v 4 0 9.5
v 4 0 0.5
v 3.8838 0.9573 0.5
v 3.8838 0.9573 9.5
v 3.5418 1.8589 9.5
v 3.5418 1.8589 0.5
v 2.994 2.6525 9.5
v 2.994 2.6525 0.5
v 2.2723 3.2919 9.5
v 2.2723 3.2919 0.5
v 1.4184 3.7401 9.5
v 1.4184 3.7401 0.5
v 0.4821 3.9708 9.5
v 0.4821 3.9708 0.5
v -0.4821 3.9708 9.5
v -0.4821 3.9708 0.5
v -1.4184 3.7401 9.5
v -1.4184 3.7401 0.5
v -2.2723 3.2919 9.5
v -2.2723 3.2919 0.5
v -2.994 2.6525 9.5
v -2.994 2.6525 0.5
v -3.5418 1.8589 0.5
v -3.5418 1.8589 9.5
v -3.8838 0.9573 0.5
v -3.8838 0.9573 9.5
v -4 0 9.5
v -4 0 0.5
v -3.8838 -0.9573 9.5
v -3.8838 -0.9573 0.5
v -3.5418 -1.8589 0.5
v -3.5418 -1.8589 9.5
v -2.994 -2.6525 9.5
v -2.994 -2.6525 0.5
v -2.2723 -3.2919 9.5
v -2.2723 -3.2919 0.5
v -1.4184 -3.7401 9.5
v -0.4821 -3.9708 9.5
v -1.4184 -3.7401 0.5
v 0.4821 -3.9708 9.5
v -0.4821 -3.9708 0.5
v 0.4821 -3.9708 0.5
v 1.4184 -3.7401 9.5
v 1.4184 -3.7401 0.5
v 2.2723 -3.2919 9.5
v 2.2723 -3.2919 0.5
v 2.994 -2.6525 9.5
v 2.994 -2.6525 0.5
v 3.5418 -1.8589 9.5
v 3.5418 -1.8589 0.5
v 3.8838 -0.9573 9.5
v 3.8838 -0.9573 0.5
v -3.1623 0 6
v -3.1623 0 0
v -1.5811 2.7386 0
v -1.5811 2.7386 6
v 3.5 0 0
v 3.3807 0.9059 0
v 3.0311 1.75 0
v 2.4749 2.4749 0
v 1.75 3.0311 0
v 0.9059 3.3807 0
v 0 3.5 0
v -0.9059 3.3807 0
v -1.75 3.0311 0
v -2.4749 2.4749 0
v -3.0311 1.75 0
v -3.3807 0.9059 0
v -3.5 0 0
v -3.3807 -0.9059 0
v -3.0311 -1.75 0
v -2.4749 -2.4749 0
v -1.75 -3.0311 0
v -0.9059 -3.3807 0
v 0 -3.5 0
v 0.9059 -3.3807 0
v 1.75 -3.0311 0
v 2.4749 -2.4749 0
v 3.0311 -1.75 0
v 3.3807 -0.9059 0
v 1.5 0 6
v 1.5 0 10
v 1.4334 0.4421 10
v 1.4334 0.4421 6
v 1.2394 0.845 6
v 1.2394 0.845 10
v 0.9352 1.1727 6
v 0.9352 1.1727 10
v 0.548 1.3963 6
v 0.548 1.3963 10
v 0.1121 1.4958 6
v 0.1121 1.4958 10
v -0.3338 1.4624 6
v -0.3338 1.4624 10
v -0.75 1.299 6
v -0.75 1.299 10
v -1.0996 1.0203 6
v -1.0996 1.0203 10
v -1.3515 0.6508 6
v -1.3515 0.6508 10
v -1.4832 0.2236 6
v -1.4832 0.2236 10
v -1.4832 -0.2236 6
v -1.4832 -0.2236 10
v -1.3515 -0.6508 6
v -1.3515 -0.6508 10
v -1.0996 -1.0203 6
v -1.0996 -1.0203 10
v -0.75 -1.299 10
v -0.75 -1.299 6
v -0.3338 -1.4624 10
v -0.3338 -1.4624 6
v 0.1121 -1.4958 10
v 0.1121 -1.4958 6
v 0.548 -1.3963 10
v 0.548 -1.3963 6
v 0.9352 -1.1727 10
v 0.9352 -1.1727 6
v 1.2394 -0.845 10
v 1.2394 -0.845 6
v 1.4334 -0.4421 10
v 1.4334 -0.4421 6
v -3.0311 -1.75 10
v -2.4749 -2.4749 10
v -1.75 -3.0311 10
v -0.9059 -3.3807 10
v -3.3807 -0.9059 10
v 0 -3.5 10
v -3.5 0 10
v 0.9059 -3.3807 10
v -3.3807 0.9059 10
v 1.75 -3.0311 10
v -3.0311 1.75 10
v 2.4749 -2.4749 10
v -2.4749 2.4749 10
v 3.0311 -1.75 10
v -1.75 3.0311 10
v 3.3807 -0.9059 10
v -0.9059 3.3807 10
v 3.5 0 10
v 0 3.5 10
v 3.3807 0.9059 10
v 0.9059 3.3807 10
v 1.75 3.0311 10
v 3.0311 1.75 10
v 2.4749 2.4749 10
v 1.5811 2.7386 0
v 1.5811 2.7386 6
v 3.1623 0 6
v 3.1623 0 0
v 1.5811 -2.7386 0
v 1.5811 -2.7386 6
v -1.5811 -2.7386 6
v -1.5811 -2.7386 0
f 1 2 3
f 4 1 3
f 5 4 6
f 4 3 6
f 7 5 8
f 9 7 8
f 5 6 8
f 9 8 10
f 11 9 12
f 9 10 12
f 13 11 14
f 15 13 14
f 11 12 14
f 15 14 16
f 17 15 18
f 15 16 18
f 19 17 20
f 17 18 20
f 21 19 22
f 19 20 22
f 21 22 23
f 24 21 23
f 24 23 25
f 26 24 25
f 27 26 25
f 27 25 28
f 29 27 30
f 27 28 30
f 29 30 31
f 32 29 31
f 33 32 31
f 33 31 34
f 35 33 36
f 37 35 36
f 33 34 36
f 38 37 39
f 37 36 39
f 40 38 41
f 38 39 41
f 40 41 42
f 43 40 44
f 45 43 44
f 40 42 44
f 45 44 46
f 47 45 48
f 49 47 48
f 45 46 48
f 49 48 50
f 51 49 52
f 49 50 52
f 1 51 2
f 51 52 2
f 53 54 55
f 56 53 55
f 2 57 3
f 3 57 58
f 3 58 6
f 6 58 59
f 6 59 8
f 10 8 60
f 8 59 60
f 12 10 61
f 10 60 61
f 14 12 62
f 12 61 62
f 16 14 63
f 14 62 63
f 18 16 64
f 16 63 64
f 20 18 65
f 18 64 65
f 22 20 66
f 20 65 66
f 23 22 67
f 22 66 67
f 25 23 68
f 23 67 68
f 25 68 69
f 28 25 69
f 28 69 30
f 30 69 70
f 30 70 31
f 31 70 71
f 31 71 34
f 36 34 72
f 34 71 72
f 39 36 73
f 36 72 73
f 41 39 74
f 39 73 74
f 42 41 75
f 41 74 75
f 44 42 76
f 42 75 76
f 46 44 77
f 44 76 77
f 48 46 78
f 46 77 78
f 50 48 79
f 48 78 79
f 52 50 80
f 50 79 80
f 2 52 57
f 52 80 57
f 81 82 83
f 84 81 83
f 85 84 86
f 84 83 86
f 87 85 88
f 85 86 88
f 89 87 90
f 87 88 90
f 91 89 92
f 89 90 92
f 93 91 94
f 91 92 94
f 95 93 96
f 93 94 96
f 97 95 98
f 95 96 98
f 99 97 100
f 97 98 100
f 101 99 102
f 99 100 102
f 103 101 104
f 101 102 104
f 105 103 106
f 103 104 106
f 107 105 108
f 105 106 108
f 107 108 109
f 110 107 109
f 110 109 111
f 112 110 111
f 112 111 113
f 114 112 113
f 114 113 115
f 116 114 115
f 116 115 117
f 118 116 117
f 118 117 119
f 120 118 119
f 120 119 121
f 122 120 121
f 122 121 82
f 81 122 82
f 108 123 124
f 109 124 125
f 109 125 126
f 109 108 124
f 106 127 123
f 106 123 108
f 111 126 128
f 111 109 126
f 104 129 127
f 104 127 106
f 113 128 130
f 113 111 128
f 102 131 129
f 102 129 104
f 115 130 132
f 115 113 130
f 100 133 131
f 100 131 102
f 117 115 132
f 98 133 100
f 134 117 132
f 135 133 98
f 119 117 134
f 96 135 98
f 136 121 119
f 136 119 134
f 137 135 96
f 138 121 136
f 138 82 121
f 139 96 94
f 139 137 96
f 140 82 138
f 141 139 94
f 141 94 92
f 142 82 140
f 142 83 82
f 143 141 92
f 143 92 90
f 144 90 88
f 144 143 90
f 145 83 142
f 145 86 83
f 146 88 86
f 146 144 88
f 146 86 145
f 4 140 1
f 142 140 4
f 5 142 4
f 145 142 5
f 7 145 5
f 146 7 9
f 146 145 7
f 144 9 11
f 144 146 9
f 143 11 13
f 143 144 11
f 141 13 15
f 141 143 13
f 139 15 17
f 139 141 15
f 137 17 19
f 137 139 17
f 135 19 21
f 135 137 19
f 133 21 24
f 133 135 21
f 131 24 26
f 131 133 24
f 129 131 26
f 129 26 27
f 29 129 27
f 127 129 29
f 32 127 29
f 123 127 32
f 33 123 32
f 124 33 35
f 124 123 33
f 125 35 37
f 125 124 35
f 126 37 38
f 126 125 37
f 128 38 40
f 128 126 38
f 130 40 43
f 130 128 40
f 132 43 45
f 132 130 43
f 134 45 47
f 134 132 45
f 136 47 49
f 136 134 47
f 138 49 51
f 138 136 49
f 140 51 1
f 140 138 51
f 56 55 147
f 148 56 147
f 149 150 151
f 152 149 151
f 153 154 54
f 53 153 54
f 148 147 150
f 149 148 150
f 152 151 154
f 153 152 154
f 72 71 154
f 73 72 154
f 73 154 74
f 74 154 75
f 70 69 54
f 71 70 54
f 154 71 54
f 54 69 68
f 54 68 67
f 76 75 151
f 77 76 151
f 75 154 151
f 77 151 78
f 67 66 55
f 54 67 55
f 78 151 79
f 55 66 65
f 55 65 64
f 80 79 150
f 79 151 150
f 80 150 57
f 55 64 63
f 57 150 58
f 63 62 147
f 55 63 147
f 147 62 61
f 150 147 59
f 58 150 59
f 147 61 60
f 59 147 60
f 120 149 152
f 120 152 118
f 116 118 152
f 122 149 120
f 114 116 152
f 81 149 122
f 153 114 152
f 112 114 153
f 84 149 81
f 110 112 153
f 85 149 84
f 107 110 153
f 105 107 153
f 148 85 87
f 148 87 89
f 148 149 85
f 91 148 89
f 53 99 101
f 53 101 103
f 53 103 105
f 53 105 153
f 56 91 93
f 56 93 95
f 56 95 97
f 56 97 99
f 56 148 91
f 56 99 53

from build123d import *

# Parameters (mm, degrees)
ESQUISSE1_R             = 4
BASE_EXTRUSION_DEPTH    = 10
CHANFREIN1_SIZE         = 0.5
ESQUISSE2_R             = 1.5
ENL_V_MAT_EXTRU_1_DEPTH = 12.489125293
ENL_V_MAT_EXTRU_2_DEPTH = 6


with BuildPart() as part:
    # Esquisse1 → Base-Extrusion (new body)
    with BuildSketch(Plane.XY):
        Circle(ESQUISSE1_R)
    extrude(amount=BASE_EXTRUSION_DEPTH)

    # Chanfrein1
    chanfrein1_edges = [part.edges().sort_by_distance(p)[0] for p in [
        (-4, 0, 0),
        (-4, 0, 10),
    ]]
    chamfer(chanfrein1_edges, length=CHANFREIN1_SIZE)

    # Esquisse2 → Enlèv. mat.-Extru.1 (cut, through all)
    with BuildSketch(Plane.XY.offset(10)):
        Circle(ESQUISSE2_R)
    extrude(amount=-ENL_V_MAT_EXTRU_1_DEPTH, mode=Mode.SUBTRACT)

    # Esquisse3 → Enlèv. mat.-Extru.2 (cut)
    with BuildSketch(Plane(origin=(0, 0, 0), x_dir=(-1, 0, 0), z_dir=(0, 0, -1))):
        Polygon((1.58113883, 2.738612788), (-1.58113883, 2.738612788), (-3.16227766, 0), (-1.58113883, -2.738612788), (1.58113883, -2.738612788), (3.16227766, 0), align=None)
    extrude(amount=-ENL_V_MAT_EXTRU_2_DEPTH, mode=Mode.SUBTRACT)


solid = part.part
